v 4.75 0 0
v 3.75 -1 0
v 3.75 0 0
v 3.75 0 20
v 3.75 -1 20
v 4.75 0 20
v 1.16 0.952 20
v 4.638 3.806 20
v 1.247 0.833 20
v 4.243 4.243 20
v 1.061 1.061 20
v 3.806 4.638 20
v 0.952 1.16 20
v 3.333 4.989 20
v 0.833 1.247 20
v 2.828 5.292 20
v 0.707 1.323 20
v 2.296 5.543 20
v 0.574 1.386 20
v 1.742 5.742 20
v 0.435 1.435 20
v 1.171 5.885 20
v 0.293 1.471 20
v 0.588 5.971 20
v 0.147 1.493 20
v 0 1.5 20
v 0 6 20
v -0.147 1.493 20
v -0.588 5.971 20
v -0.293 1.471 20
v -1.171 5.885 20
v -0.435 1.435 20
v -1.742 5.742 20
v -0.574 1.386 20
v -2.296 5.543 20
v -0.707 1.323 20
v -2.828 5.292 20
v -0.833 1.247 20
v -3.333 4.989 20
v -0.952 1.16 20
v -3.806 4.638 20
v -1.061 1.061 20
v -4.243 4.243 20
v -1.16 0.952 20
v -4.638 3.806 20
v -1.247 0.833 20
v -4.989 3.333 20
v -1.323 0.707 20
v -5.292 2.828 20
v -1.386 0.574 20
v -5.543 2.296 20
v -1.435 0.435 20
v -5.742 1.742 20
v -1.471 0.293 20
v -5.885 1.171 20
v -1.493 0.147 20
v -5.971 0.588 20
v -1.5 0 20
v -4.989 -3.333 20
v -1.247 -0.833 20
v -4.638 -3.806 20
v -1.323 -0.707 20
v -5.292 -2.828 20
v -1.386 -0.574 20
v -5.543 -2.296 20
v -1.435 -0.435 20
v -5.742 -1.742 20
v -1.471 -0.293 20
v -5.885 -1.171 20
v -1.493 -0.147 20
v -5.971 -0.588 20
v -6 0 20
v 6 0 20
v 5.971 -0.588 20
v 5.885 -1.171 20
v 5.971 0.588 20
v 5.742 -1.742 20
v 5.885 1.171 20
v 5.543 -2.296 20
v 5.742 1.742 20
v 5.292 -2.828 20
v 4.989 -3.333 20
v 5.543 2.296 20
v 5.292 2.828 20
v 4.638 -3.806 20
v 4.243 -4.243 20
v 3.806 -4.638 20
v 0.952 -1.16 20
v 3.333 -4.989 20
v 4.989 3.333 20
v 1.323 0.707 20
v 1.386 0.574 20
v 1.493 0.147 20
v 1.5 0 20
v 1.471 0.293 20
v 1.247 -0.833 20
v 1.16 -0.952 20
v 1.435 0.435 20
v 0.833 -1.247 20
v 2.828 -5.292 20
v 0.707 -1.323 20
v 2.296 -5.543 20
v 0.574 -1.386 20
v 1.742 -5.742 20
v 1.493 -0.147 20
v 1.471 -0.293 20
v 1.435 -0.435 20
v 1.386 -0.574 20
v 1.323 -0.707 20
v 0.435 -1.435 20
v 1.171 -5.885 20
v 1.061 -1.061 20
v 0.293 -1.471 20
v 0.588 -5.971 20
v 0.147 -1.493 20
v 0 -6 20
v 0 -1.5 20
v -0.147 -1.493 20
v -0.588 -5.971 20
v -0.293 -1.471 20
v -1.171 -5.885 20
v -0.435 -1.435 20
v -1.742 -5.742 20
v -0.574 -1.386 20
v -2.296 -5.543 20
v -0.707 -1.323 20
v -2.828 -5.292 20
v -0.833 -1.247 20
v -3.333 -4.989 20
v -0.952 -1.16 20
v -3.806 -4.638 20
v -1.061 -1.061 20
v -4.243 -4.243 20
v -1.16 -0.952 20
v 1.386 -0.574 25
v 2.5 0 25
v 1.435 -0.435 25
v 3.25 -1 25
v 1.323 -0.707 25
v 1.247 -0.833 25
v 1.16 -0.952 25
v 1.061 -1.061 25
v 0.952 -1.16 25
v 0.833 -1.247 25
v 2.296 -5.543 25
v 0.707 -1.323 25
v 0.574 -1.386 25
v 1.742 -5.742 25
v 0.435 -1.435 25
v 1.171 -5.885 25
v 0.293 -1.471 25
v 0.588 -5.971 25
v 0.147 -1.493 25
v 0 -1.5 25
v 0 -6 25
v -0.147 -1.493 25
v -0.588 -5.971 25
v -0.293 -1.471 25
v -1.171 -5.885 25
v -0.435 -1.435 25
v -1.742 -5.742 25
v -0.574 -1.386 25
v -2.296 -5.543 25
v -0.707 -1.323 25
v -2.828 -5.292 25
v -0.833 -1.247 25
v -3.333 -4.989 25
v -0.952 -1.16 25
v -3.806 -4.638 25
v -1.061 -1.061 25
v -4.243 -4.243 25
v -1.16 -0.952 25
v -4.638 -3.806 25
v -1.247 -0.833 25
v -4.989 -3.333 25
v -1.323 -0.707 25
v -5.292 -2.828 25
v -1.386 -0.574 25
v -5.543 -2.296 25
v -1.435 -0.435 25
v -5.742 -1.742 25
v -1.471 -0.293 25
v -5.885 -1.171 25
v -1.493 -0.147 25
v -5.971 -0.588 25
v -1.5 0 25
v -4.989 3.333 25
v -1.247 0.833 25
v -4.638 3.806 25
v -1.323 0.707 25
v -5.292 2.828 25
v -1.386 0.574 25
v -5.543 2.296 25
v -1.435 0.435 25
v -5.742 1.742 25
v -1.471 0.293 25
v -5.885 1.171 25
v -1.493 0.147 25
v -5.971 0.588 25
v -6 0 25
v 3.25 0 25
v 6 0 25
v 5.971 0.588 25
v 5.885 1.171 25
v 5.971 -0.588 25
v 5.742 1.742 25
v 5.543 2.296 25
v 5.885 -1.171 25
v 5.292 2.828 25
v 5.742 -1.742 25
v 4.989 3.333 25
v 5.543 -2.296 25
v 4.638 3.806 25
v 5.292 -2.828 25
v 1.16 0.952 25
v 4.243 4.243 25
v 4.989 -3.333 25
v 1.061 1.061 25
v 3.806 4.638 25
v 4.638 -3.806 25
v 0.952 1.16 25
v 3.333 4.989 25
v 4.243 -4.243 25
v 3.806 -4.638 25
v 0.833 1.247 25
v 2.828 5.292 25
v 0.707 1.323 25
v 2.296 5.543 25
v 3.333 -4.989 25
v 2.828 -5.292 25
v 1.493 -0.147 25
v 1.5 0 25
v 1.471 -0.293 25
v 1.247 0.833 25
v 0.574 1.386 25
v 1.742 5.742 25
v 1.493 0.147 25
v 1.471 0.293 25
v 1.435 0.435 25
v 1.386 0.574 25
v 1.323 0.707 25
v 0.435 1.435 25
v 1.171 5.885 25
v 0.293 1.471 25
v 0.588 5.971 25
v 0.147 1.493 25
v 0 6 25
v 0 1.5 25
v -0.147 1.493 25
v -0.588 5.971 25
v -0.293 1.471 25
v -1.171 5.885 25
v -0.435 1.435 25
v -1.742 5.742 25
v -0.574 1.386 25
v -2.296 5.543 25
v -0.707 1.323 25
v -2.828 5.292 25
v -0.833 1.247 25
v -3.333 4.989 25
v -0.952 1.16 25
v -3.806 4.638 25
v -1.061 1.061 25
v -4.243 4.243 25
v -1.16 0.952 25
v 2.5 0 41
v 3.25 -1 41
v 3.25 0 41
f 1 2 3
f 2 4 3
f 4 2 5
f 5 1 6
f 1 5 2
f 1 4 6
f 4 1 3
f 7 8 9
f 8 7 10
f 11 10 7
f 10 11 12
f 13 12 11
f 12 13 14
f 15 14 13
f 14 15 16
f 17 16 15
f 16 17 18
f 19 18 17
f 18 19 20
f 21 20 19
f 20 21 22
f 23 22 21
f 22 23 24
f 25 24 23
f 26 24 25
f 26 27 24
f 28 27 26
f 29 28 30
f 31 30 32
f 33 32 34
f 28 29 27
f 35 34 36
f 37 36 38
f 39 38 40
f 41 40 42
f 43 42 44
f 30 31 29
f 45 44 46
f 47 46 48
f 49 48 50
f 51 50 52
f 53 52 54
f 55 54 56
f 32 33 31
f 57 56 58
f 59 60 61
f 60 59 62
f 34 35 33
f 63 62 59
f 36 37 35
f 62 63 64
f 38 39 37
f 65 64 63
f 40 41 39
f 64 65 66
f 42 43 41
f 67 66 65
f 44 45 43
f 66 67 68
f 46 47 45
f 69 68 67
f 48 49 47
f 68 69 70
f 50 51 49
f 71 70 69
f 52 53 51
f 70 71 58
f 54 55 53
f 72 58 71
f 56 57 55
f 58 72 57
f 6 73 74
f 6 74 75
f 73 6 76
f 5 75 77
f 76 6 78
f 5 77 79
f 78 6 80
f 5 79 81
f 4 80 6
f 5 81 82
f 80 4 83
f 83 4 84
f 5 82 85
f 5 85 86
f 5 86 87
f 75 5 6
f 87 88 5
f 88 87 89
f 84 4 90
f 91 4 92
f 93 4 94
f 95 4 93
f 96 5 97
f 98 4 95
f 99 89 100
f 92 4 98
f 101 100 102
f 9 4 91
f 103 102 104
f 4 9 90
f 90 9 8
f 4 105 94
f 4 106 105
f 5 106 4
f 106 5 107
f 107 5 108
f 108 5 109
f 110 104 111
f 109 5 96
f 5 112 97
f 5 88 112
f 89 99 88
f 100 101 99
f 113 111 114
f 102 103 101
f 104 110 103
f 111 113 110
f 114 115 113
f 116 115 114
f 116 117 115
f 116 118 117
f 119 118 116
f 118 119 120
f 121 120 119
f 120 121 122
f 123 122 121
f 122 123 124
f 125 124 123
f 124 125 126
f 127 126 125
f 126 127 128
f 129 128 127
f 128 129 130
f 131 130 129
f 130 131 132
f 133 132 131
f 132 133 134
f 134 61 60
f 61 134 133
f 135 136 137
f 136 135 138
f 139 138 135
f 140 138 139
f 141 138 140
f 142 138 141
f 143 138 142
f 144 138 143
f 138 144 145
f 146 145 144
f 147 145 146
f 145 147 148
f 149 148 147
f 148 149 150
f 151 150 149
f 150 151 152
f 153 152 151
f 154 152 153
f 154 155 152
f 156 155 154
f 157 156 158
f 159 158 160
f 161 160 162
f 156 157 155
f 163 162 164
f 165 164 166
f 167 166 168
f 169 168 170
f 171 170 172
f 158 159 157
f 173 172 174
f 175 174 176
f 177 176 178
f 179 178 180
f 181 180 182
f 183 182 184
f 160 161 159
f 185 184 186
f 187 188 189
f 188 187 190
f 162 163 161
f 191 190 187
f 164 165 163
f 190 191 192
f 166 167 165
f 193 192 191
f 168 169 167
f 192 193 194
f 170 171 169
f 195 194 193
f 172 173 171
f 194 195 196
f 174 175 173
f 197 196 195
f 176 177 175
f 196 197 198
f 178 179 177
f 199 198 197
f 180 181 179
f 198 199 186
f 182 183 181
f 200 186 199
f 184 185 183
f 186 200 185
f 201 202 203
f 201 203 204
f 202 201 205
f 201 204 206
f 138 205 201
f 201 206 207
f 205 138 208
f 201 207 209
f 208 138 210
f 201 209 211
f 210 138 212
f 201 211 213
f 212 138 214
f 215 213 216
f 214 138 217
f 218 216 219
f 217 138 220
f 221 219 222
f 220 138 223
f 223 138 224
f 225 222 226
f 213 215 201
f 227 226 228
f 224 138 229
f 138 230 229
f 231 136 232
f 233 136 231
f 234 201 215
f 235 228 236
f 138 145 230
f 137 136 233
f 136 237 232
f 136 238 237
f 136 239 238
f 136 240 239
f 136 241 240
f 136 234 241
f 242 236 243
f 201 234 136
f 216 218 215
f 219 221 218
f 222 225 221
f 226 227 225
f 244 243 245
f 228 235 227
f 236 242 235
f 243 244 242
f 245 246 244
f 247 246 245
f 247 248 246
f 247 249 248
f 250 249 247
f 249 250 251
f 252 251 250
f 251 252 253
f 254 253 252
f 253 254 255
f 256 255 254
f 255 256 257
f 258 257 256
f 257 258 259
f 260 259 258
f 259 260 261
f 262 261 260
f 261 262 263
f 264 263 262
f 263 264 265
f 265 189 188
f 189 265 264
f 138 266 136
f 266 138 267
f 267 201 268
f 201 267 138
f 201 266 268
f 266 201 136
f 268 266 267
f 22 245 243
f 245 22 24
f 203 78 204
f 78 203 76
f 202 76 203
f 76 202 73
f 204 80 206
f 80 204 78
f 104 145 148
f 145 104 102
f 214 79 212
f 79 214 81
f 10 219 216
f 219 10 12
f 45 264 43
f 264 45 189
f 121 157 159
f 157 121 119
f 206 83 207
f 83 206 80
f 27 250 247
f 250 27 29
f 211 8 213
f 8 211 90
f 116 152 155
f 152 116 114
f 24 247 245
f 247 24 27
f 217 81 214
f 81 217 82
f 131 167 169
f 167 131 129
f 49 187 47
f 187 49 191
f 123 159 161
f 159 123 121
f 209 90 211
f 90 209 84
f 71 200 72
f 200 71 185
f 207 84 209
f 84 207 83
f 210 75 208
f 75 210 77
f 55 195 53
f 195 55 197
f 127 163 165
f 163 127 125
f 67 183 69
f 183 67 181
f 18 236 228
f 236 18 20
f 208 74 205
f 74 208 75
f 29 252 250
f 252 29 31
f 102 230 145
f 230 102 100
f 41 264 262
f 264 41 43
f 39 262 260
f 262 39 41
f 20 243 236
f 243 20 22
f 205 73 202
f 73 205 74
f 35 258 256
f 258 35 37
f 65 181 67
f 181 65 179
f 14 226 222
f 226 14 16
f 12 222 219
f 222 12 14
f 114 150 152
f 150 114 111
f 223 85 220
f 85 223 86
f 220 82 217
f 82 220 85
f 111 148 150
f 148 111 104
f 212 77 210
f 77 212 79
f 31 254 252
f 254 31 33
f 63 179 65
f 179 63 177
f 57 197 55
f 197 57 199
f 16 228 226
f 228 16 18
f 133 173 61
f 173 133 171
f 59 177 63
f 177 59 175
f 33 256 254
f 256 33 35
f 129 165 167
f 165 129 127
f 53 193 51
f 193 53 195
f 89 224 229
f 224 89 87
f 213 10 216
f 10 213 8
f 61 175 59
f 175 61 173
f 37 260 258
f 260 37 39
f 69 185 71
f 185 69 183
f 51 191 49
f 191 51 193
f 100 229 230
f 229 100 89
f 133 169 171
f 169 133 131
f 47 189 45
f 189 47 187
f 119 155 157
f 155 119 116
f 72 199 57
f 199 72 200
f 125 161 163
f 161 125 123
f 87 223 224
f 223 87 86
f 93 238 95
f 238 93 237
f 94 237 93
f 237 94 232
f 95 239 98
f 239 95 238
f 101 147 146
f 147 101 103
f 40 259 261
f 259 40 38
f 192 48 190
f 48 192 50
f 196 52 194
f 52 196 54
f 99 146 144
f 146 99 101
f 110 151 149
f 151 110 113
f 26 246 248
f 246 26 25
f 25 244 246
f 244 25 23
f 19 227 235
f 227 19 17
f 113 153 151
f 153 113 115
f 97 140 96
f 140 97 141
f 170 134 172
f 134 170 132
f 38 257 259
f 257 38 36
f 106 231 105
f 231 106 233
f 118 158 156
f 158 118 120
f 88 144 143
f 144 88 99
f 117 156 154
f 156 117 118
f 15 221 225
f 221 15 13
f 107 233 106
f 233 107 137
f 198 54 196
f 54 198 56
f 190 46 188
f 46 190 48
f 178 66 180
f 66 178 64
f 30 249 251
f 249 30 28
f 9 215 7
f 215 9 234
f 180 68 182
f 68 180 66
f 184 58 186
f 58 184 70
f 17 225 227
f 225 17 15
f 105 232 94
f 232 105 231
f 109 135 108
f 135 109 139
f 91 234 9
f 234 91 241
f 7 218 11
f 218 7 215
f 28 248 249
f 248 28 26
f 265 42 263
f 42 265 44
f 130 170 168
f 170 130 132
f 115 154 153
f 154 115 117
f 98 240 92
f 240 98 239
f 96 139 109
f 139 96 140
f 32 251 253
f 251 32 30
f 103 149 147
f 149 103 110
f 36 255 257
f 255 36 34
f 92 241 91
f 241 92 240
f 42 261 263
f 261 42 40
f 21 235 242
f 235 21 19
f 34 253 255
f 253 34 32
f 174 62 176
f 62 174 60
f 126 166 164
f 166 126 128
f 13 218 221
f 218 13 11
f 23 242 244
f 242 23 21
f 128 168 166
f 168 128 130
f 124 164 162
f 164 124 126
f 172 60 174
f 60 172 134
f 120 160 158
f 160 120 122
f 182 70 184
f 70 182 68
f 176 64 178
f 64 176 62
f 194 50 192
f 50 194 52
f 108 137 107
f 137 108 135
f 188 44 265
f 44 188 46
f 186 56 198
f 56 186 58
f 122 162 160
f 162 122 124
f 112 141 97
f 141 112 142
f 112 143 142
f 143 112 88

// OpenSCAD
// Hose-barb reducer: 8 mm tubing -> 5 mm tubing
// Print orientation: standing upright along +Z

$fn = 64;

// ---- Dimensions (mm) ----
tube_id_8     = 8;    // 8 mm tubing inner diameter
tube_id_5     = 5;    // 5 mm tubing inner diameter
bore          = 3;    // through-bore diameter
collar_d      = 12;   // reducer collar diameter (z = 20..25)

barb_h_8      = 10;   // 8 mm barb height
barb_od_8_b   = 7.5;  // 8 mm barb outer diameter (bottom)
barb_od_8_t   = 9.5;  // 8 mm barb outer diameter (top)

barb_h_5      = 8;    // 5 mm barb height
barb_od_5_b   = 6.5;  // 5 mm barb outer diameter (bottom)
barb_od_5_t   = 5.0;  // 5 mm barb outer diameter (top)

eps           = 0.5;  // cutter overshoot

// ---- Model ----
difference() {
    union() {
        // 8 mm barbs (z = 0..20)
        for (i = [0 : 1])
            translate([0, 0, i * barb_h_8])
                linear_extrude(height = barb_h_8)
                    polygon([
                        [barb_od_8_b / 2, 0],
                        [barb_od_8_t / 2, 0],
                        [barb_od_8_b / 2, -1]
                    ]);

        // Collar (z = 20..25)
        translate([0, 0, 20])
            cylinder(d = collar_d, h = 5);

        // 5 mm barbs (z = 25..41)
        for (i = [0 : 1])
            translate([0, 0, 25 + i * barb_h_5])
                linear_extrude(height = barb_h_5)
                    polygon([
                        [barb_od_5_b / 2, 0],
                        [barb_od_5_t / 2, 0],
                        [barb_od_5_b / 2, -1]
                    ]);
    }

    // Through-bore
    translate([0, 0, -eps])
        cylinder(d = bore, h = 42 + 2 * eps);
}
